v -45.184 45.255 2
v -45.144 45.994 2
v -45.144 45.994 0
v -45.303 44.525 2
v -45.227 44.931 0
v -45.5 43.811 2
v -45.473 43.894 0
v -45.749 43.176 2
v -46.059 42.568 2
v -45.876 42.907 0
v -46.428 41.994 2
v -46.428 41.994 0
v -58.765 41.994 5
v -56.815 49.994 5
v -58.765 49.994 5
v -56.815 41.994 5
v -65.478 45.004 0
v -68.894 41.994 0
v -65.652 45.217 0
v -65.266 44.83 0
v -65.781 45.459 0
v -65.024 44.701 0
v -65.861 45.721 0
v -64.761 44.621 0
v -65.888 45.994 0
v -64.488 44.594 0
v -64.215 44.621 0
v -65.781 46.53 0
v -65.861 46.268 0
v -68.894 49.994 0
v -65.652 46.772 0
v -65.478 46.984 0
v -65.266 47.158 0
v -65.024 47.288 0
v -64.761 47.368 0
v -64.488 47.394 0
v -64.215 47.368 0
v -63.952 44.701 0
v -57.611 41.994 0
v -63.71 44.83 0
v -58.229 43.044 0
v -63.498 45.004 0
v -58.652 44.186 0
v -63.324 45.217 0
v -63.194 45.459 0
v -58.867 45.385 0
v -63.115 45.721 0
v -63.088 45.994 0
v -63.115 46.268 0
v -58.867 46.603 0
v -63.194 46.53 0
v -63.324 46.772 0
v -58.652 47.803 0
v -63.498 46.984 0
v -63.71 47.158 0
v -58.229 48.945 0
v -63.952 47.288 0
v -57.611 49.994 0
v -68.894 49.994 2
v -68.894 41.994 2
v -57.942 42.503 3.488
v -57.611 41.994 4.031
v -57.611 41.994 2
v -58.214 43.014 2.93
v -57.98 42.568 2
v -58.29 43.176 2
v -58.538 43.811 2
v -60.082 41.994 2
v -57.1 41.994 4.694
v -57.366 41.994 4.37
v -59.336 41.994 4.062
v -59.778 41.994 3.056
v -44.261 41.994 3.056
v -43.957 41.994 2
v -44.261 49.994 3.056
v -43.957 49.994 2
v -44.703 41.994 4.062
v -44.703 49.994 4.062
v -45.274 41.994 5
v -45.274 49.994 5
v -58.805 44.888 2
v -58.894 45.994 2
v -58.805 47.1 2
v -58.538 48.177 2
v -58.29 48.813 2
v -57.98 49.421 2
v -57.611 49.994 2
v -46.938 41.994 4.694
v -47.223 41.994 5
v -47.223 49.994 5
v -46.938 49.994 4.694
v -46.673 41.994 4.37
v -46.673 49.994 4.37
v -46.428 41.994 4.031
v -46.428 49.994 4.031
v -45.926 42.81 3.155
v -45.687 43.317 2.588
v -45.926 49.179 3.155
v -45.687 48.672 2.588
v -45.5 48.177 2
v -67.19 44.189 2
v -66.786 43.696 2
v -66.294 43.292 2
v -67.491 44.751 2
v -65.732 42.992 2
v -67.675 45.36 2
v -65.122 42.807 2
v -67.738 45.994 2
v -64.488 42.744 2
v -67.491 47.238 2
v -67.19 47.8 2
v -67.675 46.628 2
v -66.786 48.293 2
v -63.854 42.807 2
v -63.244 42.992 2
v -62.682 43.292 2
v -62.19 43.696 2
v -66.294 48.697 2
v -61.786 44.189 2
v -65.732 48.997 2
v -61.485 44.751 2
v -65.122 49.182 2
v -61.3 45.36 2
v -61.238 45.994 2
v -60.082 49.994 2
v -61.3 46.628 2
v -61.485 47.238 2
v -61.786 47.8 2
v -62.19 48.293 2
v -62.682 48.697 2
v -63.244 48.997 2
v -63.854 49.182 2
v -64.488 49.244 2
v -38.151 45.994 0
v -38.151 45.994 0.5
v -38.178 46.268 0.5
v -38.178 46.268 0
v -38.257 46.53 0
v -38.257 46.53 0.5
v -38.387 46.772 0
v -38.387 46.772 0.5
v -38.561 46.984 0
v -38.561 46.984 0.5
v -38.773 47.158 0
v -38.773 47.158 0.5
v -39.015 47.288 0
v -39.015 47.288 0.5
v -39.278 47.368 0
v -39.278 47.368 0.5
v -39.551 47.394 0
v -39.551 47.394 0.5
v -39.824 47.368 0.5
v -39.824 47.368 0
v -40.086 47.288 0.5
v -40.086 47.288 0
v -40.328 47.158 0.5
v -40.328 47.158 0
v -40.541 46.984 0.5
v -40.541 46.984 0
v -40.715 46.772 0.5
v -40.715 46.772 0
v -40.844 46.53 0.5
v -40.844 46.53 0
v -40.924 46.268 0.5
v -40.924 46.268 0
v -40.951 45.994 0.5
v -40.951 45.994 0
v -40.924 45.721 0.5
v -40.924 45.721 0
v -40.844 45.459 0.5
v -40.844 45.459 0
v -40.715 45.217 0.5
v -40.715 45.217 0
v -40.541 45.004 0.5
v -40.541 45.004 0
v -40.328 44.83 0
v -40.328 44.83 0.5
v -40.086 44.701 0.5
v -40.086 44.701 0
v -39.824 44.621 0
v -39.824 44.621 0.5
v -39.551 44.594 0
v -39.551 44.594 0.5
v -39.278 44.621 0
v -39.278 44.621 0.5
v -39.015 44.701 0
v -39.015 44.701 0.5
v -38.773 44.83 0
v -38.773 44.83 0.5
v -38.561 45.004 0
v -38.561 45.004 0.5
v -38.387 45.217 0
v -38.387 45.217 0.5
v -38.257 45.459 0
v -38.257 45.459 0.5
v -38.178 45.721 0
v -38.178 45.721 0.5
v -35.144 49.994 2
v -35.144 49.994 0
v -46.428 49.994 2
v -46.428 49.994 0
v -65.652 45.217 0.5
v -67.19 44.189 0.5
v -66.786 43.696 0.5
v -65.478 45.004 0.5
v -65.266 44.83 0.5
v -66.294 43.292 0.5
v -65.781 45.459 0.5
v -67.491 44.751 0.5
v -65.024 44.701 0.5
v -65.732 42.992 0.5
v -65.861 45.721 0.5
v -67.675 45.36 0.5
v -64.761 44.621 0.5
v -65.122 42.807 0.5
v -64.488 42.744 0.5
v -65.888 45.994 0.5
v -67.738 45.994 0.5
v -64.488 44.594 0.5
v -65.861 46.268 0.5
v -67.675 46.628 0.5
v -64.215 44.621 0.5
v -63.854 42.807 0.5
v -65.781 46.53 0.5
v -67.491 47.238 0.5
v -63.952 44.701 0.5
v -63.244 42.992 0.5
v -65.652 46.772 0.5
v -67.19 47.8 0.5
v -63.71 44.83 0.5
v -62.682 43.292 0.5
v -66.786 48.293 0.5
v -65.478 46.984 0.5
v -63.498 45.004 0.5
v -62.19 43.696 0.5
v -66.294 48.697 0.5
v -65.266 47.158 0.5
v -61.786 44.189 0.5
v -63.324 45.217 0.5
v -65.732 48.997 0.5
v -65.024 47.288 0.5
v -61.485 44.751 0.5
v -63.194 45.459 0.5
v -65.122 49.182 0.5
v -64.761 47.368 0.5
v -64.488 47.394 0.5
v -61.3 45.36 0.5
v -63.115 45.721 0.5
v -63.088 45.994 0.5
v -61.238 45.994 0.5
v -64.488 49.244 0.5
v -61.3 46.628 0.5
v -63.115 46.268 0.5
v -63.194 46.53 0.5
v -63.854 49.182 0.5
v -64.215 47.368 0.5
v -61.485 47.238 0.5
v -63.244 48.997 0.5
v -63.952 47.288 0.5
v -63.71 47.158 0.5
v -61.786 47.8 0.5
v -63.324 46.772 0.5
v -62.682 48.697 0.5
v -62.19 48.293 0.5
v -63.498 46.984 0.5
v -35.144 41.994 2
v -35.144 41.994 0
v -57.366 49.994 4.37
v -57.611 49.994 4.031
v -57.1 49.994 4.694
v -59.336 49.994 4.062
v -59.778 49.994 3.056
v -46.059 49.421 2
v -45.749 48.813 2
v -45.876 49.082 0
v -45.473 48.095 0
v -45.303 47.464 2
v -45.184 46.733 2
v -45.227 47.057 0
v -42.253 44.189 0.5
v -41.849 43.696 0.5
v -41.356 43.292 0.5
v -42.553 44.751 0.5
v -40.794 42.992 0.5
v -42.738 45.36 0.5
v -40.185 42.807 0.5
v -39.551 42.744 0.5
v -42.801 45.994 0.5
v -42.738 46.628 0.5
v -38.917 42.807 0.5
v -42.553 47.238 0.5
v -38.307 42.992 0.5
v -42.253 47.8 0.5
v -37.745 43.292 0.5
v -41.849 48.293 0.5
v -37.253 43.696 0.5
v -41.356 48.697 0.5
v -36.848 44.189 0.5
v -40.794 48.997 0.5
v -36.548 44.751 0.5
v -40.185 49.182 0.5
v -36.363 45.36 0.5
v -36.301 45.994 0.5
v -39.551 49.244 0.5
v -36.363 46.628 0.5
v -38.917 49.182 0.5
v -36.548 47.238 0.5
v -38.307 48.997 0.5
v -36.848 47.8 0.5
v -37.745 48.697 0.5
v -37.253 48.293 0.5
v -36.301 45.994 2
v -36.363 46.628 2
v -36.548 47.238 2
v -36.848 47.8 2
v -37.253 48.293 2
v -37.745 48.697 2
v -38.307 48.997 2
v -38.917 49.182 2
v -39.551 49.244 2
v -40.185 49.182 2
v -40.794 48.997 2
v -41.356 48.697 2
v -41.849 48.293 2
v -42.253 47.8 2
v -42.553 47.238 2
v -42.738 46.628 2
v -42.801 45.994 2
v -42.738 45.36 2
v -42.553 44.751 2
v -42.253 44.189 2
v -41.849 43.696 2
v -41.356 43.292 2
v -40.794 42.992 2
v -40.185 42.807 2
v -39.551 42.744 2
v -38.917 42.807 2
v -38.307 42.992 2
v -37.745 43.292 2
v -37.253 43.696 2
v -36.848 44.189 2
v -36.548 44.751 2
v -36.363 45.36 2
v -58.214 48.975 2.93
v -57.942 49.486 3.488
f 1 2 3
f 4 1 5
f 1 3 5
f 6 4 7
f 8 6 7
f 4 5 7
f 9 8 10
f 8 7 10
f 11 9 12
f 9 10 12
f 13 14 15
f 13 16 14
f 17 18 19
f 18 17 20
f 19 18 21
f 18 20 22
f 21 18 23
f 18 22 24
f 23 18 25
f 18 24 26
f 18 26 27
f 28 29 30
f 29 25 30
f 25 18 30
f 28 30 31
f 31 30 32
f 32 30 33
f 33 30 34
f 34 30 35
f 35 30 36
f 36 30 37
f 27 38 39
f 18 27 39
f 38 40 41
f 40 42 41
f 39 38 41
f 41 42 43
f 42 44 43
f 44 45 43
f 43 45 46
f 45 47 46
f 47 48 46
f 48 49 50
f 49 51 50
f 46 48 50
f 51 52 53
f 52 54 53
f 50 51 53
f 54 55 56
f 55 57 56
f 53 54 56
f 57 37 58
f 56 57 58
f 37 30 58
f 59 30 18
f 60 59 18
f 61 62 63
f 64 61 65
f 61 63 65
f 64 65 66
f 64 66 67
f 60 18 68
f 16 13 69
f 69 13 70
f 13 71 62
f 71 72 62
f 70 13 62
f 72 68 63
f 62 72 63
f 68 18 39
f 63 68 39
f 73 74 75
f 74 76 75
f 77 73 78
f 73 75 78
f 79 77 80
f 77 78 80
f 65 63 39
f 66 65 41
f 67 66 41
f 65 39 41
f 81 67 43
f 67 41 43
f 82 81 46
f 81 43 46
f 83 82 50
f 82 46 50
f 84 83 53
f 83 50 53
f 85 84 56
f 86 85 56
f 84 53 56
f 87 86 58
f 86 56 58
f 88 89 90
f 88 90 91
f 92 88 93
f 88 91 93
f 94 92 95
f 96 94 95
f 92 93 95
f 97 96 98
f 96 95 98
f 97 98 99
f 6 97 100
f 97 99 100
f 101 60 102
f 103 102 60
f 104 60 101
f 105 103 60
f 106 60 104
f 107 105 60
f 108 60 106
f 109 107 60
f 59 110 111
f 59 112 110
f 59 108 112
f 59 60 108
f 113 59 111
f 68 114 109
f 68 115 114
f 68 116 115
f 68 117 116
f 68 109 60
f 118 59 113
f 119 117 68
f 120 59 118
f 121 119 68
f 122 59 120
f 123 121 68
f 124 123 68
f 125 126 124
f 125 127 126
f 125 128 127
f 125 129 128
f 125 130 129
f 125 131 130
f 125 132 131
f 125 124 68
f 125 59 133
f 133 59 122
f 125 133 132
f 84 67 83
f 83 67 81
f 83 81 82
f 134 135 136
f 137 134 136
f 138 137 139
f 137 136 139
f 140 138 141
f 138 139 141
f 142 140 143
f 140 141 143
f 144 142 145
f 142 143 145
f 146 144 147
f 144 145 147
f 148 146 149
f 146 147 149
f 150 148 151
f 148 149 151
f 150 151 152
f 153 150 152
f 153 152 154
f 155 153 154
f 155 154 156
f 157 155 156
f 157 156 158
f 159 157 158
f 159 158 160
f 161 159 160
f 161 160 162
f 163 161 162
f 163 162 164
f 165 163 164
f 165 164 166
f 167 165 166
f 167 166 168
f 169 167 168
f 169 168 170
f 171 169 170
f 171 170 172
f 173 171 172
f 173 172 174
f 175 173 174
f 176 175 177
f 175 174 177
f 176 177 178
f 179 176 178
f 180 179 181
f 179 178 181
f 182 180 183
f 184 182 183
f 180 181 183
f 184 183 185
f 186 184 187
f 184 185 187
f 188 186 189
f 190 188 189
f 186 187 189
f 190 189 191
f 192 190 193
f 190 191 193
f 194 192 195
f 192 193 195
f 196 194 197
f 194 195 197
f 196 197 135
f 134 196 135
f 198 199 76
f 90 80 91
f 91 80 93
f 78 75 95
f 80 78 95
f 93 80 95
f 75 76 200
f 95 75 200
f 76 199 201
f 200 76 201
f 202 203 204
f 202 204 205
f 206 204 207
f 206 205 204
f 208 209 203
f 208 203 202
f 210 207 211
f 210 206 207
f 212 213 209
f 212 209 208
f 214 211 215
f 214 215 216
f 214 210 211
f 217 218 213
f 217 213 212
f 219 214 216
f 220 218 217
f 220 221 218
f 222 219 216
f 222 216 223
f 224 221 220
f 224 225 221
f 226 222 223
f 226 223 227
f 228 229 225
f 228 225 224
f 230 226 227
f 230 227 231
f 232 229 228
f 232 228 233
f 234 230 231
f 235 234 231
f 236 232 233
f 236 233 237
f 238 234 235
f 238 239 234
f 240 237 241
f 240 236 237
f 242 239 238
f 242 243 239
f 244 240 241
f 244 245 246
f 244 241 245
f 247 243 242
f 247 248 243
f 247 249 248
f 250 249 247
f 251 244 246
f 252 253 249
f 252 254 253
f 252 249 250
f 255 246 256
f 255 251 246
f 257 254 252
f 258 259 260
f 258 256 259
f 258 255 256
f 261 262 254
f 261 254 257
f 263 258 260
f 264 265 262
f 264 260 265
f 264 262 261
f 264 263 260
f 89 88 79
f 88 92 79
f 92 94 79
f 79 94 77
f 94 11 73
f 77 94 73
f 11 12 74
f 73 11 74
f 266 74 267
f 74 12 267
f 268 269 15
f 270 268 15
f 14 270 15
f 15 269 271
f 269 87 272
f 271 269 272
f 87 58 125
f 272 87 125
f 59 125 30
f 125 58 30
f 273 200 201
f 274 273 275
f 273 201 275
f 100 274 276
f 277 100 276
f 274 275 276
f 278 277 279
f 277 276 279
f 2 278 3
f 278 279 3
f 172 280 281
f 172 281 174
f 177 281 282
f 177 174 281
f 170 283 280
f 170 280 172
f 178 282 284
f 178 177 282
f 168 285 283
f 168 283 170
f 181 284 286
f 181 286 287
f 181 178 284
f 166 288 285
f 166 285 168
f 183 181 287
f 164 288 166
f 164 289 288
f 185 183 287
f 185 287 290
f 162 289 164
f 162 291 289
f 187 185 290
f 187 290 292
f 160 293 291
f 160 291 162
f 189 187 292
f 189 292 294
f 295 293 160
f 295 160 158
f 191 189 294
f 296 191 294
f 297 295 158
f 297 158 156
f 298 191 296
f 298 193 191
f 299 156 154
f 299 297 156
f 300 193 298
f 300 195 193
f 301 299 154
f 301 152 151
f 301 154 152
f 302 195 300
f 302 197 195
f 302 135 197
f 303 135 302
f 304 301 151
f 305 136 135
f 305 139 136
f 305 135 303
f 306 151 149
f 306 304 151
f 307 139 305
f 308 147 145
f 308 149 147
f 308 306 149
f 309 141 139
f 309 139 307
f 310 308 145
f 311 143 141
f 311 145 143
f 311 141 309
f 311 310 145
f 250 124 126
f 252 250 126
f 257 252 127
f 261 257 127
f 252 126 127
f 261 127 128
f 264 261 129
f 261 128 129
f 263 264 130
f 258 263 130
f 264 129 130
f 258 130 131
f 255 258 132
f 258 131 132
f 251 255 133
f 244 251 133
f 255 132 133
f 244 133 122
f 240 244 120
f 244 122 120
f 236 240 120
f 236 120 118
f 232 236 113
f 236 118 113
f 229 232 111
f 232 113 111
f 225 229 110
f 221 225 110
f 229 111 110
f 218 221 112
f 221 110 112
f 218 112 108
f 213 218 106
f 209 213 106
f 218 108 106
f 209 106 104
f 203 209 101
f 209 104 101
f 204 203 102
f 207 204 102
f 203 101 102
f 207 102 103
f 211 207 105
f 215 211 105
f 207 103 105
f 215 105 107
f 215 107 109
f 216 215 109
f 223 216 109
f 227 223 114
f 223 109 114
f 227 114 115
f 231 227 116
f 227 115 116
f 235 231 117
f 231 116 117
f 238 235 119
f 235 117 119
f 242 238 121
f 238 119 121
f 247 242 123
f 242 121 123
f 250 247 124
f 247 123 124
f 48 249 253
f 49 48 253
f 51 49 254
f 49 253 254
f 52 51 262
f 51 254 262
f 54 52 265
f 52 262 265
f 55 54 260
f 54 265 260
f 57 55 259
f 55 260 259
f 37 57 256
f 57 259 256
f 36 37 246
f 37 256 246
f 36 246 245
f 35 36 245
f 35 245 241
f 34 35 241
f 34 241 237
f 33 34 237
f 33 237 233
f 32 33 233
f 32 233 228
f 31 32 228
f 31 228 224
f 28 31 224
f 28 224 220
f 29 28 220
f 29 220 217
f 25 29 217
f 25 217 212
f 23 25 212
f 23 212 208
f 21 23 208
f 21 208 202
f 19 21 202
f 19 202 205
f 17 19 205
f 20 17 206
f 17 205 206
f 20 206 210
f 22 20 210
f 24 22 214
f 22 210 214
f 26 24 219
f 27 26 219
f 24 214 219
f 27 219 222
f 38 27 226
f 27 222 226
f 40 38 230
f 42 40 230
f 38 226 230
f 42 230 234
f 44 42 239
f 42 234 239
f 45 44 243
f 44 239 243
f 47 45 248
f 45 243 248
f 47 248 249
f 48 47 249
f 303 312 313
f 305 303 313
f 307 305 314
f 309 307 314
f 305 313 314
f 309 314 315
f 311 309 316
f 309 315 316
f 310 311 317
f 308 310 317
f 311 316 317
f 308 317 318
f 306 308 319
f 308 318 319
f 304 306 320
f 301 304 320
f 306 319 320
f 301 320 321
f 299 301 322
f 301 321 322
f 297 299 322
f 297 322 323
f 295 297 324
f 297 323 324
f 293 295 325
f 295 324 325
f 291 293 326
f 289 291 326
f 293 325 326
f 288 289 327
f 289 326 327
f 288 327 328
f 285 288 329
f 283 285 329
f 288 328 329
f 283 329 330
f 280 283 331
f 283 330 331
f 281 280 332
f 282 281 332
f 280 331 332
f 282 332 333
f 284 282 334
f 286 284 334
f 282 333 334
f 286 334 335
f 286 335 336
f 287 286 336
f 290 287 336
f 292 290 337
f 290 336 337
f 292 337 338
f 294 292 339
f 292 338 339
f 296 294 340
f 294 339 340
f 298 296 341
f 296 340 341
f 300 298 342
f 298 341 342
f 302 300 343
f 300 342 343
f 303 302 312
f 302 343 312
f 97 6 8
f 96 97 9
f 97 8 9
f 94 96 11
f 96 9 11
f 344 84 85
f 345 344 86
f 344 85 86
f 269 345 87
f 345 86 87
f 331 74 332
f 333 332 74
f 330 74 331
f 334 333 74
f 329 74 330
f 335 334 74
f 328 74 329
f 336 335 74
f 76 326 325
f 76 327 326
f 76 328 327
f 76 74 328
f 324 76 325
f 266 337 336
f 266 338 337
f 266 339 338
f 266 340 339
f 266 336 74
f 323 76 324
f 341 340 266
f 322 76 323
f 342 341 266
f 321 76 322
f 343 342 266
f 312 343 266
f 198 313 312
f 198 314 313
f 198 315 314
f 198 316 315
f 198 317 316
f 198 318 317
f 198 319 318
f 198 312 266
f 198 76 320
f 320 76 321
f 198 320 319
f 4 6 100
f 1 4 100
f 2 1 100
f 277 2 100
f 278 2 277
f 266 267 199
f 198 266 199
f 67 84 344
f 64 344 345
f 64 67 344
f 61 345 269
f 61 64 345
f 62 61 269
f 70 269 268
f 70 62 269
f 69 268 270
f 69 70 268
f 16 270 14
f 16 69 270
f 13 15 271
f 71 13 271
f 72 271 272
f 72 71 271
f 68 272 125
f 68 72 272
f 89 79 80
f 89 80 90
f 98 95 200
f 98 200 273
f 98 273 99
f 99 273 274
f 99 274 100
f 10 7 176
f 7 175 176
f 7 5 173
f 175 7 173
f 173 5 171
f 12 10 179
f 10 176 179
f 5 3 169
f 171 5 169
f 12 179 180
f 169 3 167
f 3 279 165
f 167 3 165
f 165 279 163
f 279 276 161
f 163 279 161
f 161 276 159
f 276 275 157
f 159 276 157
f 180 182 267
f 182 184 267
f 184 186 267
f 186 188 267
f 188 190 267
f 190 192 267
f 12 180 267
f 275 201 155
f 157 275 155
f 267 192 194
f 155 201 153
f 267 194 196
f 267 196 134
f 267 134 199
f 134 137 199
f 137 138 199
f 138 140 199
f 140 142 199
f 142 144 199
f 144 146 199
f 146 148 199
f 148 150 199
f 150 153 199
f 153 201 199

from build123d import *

# Parameters (mm, degrees)
SALIENTE_EXTRUIR1_DEPTH   = 2
SALIENTE_EXTRUIR1_2_DEPTH = 2
SALIENTE_EXTRUIR2_DEPTH   = 4
SALIENTE_EXTRUIR3_REACH   = 5
SALIENTE_EXTRUIR4_REACH   = 5
SALIENTE_EXTRUIR5_REACH   = 5
SALIENTE_EXTRUIR6_REACH   = 5
CROQUIS7_R                = 3.25
CORTAR_EXTRUIR1_DEPTH     = 1.5
CORTAR_EXTRUIR2_REACH     = 2.5
CROQUIS8_R                = 1.4


with BuildPart() as part:
    # Croquis1 → Saliente-Extruir1 (new body)
    with BuildSketch(Plane.XY):
        with BuildLine():
            Line((-68.894276555, 41.994416346), (-57.610843867, 41.994416346))
            ThreePointArc((-57.610843867, 41.994416346), (-58.894276555, 45.994416346), (-57.610843867, 49.994416346))
            Line((-57.610843867, 49.994416346), (-68.894276555, 49.994416346))
            Line((-68.894276555, 49.994416346), (-68.894276555, 41.994416346))
        make_face()
    extrude(amount=SALIENTE_EXTRUIR1_DEPTH)



with BuildPart() as body_2:
    # Croquis1 → Saliente-Extruir1 2 (new body)
    with BuildSketch(Plane.XY):
        with BuildLine():
            ThreePointArc((-45.144276555, 45.994416346), (-45.472993248, 43.893987851), (-46.427709243, 41.994416346))
            Line((-46.427709243, 41.994416346), (-35.144276555, 41.994416346))
            Line((-35.144276555, 41.994416346), (-35.144276555, 49.994416346))
            Line((-35.144276555, 49.994416346), (-46.427709243, 49.994416346))
            ThreePointArc((-46.427709243, 49.994416346), (-45.472993248, 48.094844842), (-45.144276555, 45.994416346))
        make_face()
    extrude(amount=SALIENTE_EXTRUIR1_2_DEPTH)


with BuildPart() as part_1:
    add(part.part)

    add(body_2.part)  # Saliente-Extruir2 merges body 2
    # Croquis2 → Saliente-Extruir2 (add, symmetric)
    with BuildSketch(Plane(origin=(0, 45.994416346, 0), x_dir=(-1, 0, 0), z_dir=(0, -1, 0))):
        with BuildLine():
            Line((45.50007415, -2), (43.957018807, -2))
            ThreePointArc((43.957018807, -2), (44.465042586, -3.566029122), (45.273907773, -5))
            Line((45.273907773, -5), (47.223445032, -5))
            ThreePointArc((47.223445032, -5), (46.16628602, -3.612291153), (45.50007415, -2))
        make_face()
        with BuildLine():
            Line((56.815108078, -5), (58.764645337, -5))
            ThreePointArc((58.764645337, -5), (59.573510524, -3.566029122), (60.081534303, -2))
            Line((60.081534303, -2), (58.53847896, -2))
            ThreePointArc((58.53847896, -2), (57.87226709, -3.612291153), (56.815108078, -5))
        make_face()
    extrude(amount=SALIENTE_EXTRUIR2_DEPTH, both=True)

    # Croquis3 → Saliente-Extruir3 (add, up to next)
    with BuildSketch(Plane.XY.offset(2), mode=Mode.PRIVATE) as saliente_extruir3_sk1:
        with BuildLine():
            Line((-57.610843867, 49.994416346), (-58.53847896, 49.994416346))
            Line((-58.53847896, 49.994416346), (-58.53847896, 48.177447496))
            ThreePointArc((-58.53847896, 48.177447496), (-58.142431766, 49.12053139), (-57.610843867, 49.994416346))
        make_face()
    saliente_extruir3_tool1 = extrude(saliente_extruir3_sk1.sketch, amount=SALIENTE_EXTRUIR3_REACH, mode=Mode.PRIVATE) - part_1.part
    add(saliente_extruir3_tool1.solids().sort_by_distance((-58.247136, 49.429266, 2))[0])

    # Croquis4 → Saliente-Extruir4 (add, up to next)
    with BuildSketch(Plane.XY.offset(2), mode=Mode.PRIVATE) as saliente_extruir4_sk1:
        with BuildLine():
            Line((-45.50007415, 49.994416346), (-46.427709243, 49.994416346))
            ThreePointArc((-46.427709243, 49.994416346), (-45.896121344, 49.12053139), (-45.50007415, 48.177447496))
            Line((-45.50007415, 48.177447496), (-45.50007415, 49.994416346))
        make_face()
    saliente_extruir4_tool1 = extrude(saliente_extruir4_sk1.sketch, amount=SALIENTE_EXTRUIR4_REACH, mode=Mode.PRIVATE) - part_1.part
    add(saliente_extruir4_tool1.solids().sort_by_distance((-45.791417, 49.429266, 2))[0])

    # Croquis5 → Saliente-Extruir5 (add, up to next)
    with BuildSketch(Plane.XY.offset(2), mode=Mode.PRIVATE) as saliente_extruir5_sk1:
        with BuildLine():
            Line((-58.53847896, 41.994416346), (-57.610843867, 41.994416346))
            ThreePointArc((-57.610843867, 41.994416346), (-58.142431766, 42.868301303), (-58.53847896, 43.811385197))
            Line((-58.53847896, 43.811385197), (-58.53847896, 41.994416346))
        make_face()
    saliente_extruir5_tool1 = extrude(saliente_extruir5_sk1.sketch, amount=SALIENTE_EXTRUIR5_REACH, mode=Mode.PRIVATE) - part_1.part
    add(saliente_extruir5_tool1.solids().sort_by_distance((-58.247136, 42.559567, 2))[0])

    # Croquis6 → Saliente-Extruir6 (add, up to next)
    with BuildSketch(Plane.XY.offset(2), mode=Mode.PRIVATE) as saliente_extruir6_sk1:
        with BuildLine():
            Line((-46.427709243, 41.994416346), (-45.50007415, 41.994416346))
            Line((-45.50007415, 41.994416346), (-45.50007415, 43.811385197))
            ThreePointArc((-45.50007415, 43.811385197), (-45.896121344, 42.868301303), (-46.427709243, 41.994416346))
        make_face()
    saliente_extruir6_tool1 = extrude(saliente_extruir6_sk1.sketch, amount=SALIENTE_EXTRUIR6_REACH, mode=Mode.PRIVATE) - part_1.part
    add(saliente_extruir6_tool1.solids().sort_by_distance((-45.791417, 42.559567, 2))[0])

    # Croquis7 → Cortar-Extruir1 (cut)
    with BuildSketch(Plane.XY.offset(2)):
        with Locations((-64.487905429, 45.994416346)):
            Circle(CROQUIS7_R)
        with Locations((-39.550647681, 45.994416346)):
            Circle(CROQUIS7_R)
    extrude(amount=-CORTAR_EXTRUIR1_DEPTH, mode=Mode.SUBTRACT)

    # Croquis8 → Cortar-Extruir2 (cut, up to next)
    with BuildSketch(Plane.XY.offset(0.5), mode=Mode.PRIVATE) as cortar_extruir2_sk1:
        with Locations((-64.487905429, 45.994416346)):
            Circle(CROQUIS8_R)
    cortar_extruir2_tool1 = extrude(cortar_extruir2_sk1.sketch, amount=-CORTAR_EXTRUIR2_REACH, mode=Mode.PRIVATE) & part_1.part
    add(cortar_extruir2_tool1.solids().sort_by_distance((-64.487905, 45.994416, 0.5))[0], mode=Mode.SUBTRACT)
    # Croquis8 → Cortar-Extruir2 (cut, up to next)
    with BuildSketch(Plane.XY.offset(0.5), mode=Mode.PRIVATE) as cortar_extruir2_sk2:
        with Locations((-39.550647681, 45.994416346)):
            Circle(CROQUIS8_R)
    cortar_extruir2_tool2 = extrude(cortar_extruir2_sk2.sketch, amount=-CORTAR_EXTRUIR2_REACH, mode=Mode.PRIVATE) & part_1.part
    add(cortar_extruir2_tool2.solids().sort_by_distance((-39.550648, 45.994416, 0.5))[0], mode=Mode.SUBTRACT)


solid = part_1.part
